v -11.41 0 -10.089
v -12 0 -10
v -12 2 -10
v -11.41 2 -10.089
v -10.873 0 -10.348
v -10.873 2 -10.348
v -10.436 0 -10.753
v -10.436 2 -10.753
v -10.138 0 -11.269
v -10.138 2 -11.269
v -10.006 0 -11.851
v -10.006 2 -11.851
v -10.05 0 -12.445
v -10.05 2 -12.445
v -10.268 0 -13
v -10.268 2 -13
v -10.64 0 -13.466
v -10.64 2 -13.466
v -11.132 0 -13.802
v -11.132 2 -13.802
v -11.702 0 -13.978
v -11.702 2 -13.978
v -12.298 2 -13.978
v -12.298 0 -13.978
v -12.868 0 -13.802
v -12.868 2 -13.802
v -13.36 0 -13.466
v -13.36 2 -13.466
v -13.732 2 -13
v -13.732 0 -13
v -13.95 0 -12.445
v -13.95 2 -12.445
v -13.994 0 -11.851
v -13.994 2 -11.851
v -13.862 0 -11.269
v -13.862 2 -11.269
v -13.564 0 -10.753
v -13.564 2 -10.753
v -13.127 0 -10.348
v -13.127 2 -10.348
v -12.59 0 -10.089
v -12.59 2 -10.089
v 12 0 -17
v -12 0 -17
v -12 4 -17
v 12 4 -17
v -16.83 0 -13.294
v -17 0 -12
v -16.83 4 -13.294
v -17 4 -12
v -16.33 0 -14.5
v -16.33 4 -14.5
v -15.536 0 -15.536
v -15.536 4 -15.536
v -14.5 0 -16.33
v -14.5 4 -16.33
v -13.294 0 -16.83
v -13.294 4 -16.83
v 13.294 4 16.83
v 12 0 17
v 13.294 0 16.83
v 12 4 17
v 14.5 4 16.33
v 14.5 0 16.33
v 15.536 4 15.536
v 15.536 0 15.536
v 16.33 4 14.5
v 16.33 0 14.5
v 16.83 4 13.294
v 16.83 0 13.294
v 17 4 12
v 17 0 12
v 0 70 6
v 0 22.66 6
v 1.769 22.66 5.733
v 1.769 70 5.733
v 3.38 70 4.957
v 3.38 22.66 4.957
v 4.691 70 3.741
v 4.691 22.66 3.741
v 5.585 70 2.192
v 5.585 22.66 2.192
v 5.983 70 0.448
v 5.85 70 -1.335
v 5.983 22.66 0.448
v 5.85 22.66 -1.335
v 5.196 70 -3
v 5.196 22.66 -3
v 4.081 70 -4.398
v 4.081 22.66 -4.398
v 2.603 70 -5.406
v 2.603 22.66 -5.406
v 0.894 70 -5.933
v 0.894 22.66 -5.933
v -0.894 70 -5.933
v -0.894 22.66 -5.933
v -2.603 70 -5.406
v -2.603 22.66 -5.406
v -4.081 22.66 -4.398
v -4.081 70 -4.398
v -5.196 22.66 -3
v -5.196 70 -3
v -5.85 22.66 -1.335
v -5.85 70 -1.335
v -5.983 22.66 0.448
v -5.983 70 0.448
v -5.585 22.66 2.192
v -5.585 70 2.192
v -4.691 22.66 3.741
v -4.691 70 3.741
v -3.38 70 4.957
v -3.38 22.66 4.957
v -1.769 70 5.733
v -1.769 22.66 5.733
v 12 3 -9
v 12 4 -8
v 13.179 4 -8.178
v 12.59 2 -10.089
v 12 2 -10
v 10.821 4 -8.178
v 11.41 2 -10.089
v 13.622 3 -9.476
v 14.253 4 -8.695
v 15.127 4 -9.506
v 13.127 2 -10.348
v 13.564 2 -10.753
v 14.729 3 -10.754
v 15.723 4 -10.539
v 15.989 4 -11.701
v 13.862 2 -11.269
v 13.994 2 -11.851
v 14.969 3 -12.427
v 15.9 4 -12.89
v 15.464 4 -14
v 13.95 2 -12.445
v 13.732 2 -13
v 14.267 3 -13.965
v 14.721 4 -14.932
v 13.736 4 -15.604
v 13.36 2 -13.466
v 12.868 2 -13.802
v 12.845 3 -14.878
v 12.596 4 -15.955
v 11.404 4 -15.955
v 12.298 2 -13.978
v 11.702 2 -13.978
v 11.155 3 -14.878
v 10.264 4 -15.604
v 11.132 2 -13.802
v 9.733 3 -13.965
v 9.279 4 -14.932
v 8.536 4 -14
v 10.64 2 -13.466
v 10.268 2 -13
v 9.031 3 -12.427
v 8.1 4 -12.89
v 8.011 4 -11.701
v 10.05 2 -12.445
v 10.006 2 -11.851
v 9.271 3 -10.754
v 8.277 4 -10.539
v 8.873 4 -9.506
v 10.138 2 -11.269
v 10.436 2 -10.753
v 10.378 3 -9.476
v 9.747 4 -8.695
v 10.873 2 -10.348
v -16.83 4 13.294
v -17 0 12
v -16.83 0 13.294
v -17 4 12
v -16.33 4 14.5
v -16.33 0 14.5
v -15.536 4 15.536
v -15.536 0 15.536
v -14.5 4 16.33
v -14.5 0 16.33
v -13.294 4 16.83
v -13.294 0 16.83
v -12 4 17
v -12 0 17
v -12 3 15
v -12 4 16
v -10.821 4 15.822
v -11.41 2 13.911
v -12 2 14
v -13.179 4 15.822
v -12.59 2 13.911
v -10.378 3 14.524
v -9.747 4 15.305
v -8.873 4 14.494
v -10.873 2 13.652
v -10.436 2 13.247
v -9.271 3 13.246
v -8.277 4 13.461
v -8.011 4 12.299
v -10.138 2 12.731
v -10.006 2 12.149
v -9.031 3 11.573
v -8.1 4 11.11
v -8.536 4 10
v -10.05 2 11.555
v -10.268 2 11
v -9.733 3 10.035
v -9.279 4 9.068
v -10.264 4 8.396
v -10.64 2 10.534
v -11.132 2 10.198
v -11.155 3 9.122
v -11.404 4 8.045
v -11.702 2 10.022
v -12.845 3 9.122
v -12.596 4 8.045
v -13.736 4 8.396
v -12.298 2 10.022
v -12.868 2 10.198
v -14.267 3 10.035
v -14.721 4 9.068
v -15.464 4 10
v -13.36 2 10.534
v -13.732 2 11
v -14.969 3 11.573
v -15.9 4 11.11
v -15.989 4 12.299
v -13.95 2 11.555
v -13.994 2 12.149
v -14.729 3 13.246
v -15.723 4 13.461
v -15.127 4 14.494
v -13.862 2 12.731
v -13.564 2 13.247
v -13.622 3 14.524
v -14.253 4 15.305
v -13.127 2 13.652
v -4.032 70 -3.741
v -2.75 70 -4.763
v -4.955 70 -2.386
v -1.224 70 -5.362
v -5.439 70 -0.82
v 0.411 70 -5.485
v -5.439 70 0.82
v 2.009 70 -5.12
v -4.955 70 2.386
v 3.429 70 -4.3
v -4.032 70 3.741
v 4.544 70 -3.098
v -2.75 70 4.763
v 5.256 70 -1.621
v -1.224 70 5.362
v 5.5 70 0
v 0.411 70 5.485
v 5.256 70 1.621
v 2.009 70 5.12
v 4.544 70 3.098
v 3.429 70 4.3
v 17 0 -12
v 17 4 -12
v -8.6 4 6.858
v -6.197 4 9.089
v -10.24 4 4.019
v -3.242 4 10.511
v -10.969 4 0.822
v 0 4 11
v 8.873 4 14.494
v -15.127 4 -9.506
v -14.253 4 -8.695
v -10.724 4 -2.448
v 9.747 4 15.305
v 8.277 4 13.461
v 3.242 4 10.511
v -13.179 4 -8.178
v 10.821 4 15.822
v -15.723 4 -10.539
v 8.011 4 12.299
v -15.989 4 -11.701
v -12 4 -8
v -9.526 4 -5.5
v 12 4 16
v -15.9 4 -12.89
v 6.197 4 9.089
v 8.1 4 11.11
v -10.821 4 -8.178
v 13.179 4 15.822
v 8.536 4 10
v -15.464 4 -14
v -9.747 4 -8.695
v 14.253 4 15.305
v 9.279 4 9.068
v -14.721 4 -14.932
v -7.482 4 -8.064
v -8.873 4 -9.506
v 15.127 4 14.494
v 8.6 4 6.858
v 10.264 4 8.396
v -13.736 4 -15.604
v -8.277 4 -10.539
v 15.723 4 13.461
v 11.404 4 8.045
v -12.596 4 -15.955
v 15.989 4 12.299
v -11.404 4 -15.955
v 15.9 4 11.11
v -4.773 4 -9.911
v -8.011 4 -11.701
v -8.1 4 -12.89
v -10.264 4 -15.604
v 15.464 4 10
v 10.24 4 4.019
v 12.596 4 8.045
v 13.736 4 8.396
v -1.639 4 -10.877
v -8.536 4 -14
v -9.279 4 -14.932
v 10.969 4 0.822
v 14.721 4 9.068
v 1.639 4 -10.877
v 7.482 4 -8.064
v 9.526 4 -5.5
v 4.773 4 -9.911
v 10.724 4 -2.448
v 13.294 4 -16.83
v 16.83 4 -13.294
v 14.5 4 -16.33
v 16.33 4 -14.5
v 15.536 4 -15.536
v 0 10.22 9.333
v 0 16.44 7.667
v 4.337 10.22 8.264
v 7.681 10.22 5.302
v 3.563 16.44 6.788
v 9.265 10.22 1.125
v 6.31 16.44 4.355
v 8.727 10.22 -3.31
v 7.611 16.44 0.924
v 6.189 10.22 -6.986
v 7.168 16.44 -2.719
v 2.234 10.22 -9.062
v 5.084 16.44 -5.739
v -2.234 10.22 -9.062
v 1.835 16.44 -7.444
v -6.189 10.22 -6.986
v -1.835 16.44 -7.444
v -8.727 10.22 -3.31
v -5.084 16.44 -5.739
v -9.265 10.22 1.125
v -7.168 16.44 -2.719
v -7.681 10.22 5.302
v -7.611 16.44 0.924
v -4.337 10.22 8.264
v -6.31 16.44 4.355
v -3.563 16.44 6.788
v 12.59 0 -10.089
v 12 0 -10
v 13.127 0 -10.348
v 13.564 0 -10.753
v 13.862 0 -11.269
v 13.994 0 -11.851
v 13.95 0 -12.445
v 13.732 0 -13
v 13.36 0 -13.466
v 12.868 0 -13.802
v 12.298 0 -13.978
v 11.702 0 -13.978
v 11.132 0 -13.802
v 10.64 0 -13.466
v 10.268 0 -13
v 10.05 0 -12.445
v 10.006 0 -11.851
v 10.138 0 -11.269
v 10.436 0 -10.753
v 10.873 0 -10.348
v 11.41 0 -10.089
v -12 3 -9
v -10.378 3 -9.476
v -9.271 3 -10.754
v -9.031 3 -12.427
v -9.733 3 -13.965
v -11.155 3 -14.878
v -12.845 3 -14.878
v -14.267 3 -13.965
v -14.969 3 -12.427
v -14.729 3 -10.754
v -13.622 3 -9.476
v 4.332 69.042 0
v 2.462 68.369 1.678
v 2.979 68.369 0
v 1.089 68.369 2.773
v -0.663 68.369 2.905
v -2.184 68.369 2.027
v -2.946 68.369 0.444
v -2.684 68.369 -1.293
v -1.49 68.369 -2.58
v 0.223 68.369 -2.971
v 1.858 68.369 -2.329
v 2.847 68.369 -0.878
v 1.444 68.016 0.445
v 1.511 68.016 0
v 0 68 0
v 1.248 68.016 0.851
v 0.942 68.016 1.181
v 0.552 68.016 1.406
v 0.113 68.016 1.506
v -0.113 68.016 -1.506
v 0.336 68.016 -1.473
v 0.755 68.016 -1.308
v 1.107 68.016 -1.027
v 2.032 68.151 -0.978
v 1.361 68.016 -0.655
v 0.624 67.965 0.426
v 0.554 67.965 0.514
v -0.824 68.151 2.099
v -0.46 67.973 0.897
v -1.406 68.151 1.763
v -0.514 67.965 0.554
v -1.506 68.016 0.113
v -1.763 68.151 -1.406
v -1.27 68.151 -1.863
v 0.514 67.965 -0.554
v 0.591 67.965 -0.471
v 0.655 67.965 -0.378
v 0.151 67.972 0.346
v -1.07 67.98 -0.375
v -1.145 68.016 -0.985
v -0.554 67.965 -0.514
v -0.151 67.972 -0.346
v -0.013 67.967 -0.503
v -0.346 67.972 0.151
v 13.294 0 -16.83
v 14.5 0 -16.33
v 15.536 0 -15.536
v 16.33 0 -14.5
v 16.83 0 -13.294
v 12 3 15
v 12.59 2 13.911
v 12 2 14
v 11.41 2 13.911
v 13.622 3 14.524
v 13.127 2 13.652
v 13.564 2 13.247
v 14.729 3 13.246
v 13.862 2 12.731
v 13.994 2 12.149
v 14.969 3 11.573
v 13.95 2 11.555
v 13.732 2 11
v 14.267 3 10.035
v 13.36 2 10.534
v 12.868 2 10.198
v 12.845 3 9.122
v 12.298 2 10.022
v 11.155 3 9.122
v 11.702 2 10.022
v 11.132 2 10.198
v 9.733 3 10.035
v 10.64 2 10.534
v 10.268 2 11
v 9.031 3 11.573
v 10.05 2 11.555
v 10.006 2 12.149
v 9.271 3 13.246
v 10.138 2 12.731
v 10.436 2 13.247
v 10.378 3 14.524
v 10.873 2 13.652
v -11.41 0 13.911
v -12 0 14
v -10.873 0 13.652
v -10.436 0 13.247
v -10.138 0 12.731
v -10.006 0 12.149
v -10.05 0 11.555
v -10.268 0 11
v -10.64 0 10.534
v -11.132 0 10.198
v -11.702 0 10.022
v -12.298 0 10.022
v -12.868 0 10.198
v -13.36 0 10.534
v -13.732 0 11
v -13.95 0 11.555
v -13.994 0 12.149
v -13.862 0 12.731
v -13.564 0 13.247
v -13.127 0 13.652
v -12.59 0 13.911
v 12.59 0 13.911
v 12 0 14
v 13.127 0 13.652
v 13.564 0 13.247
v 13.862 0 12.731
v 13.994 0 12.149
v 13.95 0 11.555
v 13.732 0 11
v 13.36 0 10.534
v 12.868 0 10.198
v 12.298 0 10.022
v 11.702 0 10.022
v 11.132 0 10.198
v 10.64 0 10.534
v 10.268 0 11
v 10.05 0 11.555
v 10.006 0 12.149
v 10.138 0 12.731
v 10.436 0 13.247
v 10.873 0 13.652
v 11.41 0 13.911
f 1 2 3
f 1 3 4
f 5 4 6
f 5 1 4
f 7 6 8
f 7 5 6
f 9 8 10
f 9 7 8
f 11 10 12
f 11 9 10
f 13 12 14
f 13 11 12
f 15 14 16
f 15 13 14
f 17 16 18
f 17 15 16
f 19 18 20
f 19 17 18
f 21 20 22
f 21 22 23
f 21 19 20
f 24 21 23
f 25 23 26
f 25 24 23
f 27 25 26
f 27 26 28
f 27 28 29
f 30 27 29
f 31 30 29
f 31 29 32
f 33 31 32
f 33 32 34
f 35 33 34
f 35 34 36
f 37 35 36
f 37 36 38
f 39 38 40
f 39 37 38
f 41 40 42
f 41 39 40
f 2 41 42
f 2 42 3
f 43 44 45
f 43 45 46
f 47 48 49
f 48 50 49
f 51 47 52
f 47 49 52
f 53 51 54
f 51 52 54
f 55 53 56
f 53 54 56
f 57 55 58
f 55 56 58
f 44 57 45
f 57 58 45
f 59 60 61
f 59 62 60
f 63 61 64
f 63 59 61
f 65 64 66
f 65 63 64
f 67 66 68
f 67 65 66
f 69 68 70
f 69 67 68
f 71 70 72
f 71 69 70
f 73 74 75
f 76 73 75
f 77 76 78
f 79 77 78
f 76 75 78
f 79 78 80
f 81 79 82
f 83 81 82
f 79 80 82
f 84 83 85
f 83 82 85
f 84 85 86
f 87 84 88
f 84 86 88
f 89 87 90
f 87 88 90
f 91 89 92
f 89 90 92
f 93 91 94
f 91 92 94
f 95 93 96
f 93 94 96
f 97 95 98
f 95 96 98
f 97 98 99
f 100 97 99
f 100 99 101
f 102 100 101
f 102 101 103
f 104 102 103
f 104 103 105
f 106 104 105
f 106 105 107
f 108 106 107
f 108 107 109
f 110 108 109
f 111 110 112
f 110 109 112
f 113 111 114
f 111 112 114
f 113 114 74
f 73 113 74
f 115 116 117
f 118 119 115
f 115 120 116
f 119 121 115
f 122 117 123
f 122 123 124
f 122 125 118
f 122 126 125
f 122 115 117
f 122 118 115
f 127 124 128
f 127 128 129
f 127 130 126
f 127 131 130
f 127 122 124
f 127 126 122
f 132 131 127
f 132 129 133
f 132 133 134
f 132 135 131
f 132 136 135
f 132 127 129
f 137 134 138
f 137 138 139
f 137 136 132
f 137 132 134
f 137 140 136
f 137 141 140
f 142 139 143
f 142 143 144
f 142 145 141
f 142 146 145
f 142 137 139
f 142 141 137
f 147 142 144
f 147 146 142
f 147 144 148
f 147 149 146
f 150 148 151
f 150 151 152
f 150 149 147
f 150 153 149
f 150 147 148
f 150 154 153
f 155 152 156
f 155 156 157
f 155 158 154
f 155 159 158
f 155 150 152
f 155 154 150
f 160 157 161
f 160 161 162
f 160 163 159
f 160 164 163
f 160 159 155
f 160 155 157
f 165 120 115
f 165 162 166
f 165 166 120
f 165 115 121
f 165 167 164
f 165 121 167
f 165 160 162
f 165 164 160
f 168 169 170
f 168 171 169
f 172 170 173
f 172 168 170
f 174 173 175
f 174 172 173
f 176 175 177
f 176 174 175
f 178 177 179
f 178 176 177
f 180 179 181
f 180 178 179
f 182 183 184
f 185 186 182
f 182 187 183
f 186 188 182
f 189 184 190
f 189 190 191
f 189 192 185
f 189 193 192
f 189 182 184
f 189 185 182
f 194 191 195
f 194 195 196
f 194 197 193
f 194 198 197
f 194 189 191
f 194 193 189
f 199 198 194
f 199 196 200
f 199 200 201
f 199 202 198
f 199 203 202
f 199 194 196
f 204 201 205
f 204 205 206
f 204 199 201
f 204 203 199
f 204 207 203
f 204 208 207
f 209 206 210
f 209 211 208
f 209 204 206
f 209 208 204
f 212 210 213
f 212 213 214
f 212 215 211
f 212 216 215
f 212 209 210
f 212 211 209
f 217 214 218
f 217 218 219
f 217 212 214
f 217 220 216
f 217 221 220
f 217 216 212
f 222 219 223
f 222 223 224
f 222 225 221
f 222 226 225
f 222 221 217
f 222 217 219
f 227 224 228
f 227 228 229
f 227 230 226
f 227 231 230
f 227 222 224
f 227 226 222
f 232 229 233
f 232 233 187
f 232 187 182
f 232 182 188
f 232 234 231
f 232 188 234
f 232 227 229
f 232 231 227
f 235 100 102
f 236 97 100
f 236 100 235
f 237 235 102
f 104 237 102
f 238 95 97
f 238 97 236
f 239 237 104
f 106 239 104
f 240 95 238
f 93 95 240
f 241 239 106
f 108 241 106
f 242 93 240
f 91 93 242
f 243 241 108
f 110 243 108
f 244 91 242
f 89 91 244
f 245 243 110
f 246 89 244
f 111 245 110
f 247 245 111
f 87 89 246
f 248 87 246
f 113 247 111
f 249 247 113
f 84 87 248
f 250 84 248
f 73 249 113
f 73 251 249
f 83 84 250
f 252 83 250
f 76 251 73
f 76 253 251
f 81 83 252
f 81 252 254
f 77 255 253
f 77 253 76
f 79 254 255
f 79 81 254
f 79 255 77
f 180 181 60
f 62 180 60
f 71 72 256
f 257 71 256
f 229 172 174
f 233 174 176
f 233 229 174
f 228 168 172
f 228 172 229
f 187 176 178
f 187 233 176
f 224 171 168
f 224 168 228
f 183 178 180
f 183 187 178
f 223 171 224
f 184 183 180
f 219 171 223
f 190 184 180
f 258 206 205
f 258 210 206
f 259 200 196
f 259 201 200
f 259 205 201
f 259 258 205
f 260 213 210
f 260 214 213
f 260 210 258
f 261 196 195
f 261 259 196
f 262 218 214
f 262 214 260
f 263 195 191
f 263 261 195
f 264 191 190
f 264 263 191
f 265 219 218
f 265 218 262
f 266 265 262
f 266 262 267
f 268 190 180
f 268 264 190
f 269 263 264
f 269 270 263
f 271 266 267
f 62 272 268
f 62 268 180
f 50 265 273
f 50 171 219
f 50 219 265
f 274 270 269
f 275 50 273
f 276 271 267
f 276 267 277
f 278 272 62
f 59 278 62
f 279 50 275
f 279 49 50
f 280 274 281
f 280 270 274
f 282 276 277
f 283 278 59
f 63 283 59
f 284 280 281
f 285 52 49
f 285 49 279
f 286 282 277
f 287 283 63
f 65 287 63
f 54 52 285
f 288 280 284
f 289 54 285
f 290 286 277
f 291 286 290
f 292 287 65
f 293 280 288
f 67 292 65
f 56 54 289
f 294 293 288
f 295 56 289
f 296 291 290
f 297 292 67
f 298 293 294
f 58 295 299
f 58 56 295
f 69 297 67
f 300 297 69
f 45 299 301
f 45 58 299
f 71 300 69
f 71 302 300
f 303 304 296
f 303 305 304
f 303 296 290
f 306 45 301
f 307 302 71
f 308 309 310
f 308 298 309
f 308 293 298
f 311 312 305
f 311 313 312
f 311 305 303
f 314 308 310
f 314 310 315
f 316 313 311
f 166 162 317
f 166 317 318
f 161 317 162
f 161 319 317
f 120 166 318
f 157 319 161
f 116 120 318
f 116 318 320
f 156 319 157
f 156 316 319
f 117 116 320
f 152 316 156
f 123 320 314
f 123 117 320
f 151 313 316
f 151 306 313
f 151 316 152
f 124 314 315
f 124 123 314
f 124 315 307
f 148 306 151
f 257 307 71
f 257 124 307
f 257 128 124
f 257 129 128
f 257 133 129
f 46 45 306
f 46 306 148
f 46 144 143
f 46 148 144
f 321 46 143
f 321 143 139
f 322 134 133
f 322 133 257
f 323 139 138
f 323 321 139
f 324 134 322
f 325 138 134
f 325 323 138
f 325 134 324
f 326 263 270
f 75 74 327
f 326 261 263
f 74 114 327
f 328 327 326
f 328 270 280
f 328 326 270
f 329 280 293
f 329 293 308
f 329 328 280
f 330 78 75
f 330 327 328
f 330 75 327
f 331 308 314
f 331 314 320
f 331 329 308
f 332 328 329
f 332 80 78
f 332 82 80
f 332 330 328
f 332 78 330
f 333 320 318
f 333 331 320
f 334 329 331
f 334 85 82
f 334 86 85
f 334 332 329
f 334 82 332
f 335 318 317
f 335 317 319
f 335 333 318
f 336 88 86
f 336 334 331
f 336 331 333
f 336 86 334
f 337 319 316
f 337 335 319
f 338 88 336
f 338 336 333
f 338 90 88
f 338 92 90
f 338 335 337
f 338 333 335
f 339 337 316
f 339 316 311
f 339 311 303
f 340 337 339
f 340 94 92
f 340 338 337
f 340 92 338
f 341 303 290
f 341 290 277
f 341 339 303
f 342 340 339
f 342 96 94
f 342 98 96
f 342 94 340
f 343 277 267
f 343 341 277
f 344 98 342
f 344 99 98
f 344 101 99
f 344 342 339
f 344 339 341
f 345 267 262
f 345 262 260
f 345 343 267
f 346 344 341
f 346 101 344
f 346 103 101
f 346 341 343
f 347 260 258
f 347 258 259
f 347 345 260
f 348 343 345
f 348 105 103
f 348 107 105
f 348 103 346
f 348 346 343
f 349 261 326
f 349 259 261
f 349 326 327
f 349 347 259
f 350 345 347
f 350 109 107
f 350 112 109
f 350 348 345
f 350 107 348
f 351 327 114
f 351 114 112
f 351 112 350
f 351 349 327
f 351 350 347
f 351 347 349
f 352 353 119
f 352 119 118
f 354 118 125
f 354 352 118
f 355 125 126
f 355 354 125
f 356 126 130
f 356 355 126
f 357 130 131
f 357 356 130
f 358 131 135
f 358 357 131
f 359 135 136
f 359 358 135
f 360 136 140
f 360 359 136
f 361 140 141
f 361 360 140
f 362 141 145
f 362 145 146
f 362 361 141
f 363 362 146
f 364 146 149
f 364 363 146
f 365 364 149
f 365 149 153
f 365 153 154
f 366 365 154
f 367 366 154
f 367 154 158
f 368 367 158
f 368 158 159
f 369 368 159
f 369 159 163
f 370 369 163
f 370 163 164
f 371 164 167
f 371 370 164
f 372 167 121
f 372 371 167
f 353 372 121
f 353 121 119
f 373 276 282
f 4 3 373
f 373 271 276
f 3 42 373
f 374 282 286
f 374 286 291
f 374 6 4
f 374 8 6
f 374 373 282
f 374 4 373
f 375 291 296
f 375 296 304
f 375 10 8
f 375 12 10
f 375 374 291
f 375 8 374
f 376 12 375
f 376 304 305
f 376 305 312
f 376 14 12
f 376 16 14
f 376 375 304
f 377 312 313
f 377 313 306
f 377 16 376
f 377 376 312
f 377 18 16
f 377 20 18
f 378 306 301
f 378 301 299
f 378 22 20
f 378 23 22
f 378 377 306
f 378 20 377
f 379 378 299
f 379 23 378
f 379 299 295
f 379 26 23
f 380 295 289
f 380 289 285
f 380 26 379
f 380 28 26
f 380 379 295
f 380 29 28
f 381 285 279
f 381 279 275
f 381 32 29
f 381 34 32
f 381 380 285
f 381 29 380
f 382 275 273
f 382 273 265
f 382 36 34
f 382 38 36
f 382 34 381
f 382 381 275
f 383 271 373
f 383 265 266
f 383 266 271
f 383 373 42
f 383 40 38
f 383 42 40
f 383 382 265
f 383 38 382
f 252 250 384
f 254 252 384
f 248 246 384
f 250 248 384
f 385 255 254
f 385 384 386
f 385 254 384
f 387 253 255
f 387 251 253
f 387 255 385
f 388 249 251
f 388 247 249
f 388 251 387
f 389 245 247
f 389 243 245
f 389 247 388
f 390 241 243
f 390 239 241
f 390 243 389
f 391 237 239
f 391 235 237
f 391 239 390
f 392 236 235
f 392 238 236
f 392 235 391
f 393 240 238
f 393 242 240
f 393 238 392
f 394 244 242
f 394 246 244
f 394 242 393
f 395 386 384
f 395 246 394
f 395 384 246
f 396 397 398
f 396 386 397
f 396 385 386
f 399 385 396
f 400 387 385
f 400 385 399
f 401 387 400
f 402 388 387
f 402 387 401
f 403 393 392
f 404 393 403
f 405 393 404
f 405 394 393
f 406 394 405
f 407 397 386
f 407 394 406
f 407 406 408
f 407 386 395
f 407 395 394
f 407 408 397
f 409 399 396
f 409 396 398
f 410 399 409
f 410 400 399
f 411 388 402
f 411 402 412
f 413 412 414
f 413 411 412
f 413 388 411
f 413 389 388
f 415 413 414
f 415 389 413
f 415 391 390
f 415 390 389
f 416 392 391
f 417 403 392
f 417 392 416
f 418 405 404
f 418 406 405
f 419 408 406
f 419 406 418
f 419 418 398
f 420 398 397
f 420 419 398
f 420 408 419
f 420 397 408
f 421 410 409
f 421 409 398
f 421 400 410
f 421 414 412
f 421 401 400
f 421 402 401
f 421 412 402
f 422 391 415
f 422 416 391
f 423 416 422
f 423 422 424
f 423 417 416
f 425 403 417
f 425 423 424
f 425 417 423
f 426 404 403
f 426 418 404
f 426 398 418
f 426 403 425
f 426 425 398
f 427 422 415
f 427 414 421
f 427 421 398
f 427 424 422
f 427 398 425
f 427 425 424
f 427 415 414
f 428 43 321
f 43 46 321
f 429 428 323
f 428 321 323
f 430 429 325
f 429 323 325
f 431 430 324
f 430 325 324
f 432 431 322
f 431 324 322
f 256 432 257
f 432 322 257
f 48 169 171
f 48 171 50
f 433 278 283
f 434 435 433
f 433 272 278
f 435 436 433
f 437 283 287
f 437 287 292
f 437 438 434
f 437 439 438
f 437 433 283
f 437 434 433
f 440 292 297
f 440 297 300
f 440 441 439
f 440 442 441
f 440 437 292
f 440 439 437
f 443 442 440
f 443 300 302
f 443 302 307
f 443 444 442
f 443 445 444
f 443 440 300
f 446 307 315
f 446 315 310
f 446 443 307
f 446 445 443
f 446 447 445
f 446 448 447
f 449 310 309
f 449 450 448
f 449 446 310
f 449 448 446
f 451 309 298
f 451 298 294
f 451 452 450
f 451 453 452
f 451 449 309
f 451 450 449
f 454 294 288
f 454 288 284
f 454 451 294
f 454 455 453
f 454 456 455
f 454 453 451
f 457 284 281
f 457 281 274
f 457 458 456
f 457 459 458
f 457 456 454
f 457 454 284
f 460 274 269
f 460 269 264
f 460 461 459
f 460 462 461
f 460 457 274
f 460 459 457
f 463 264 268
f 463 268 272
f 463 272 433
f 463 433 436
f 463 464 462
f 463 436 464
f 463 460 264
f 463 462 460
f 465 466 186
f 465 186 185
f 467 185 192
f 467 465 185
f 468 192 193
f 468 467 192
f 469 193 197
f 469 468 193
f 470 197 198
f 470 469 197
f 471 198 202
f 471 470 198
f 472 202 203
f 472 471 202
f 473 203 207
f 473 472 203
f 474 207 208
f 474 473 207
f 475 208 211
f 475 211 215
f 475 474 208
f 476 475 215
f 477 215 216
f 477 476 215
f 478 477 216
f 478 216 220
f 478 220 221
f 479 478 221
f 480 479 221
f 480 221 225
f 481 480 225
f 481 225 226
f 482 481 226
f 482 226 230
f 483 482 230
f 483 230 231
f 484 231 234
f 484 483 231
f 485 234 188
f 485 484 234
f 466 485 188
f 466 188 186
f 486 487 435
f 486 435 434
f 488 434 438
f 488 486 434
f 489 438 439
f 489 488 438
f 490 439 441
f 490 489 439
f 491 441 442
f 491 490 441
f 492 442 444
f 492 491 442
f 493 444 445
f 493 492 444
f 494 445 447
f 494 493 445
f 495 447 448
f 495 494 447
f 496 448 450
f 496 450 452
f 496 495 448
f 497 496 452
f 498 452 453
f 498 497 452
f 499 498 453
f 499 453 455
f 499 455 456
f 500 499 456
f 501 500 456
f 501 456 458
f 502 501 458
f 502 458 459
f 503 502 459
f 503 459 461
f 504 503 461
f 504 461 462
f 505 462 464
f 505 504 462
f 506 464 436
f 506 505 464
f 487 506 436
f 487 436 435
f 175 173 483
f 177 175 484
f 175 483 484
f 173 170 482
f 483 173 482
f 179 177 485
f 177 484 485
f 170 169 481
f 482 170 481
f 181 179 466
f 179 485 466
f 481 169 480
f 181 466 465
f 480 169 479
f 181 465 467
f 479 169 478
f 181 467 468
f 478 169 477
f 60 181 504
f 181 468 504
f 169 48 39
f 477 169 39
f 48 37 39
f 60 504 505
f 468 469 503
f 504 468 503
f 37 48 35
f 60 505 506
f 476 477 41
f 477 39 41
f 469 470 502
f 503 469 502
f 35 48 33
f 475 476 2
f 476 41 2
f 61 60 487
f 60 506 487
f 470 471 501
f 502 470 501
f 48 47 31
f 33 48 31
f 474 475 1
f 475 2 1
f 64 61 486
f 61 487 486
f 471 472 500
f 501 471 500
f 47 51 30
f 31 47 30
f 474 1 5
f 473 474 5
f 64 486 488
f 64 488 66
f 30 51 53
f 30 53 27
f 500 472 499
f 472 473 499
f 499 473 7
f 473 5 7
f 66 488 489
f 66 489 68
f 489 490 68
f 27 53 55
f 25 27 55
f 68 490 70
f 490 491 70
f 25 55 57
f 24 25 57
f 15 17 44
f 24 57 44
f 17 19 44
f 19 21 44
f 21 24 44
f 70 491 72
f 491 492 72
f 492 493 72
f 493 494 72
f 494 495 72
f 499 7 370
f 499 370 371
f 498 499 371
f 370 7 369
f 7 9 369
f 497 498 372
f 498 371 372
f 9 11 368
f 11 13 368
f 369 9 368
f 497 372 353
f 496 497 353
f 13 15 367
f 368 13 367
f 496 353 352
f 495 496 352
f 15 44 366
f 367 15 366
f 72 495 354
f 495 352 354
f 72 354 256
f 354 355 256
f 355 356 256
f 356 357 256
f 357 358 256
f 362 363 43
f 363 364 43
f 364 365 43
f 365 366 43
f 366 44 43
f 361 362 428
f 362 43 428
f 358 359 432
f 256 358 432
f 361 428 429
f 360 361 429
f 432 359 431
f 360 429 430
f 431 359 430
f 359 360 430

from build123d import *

# Parameters (mm, degrees)
SKETCH_1_W      = 34
SKETCH_1_H      = 34
SKETCH_1_R      = 2
EXTRUDE_1_DEPTH = 4
FILLET_1_R      = 5
SKETCH_2_R      = 6
EXTRUDE_2_DEPTH = 66
CHAMFER_1_SIZE  = 5
CHAMFER_1_SIZE2 = 18.660254038
CHAMFER_2_SIZE  = 2


with BuildPart() as part:
    # Эскиз1 → Бобышка-Вытянуть1 (new body)
    with BuildSketch(Plane(origin=(0, 0, 0), x_dir=(1, 0, 0), z_dir=(0, 1, 0))):
        Rectangle(SKETCH_1_W, SKETCH_1_H)
        with Locations(Location((-12, 12, 0), (0, 0, 270))):
            Circle(SKETCH_1_R, mode=Mode.SUBTRACT)
        with Locations(Location((12, 12, 0), (0, 0, 270))):
            Circle(SKETCH_1_R, mode=Mode.SUBTRACT)
        with Locations(Location((12, -12, 0), (0, 0, 270))):
            Circle(SKETCH_1_R, mode=Mode.SUBTRACT)
        with Locations(Location((-12, -12, 0), (0, 0, 270))):
            Circle(SKETCH_1_R, mode=Mode.SUBTRACT)
    extrude(amount=EXTRUDE_1_DEPTH)

    # Скругление1
    fillet_1_edges = [part.edges().sort_by_distance(p)[0] for p in [
        (17, 2, 17),
        (-17, 2, 17),
        (-17, 2, -17),
        (17, 2, -17),
    ]]
    fillet(fillet_1_edges, radius=FILLET_1_R)

    # Эскиз2 → Бобышка-Вытянуть2 (add)
    with BuildSketch(Plane(origin=(0, 4, 0), x_dir=(1, 0, 0), z_dir=(0, 1, 0))):
        with Locations(Location((0, 0, 0), (0, 0, 270))):
            Circle(SKETCH_2_R)
    extrude(amount=EXTRUDE_2_DEPTH)

    # Эскиз7 → Вырез-Повернуть3 (revolve, cut)
    with BuildSketch(Plane.XY):
        with BuildLine():
            Line((5.5, 70), (0, 70))
            Line((0, 70), (0, 68))
            ThreePointArc((0, 68), (2.979435889, 68.369051304), (5.5, 70))
        make_face()
    revolve(axis=Axis((0, 82.404747685, 0), (0, -1, 0)), mode=Mode.SUBTRACT)

    # Фаска1
    chamfer_1_edges = [part.edges().sort_by_distance(p)[0] for p in [
        (0, 4, -6),
    ]]
    chamfer_1_side = [part.faces().sort_by_distance(p)[0] for p in [
        (0, 4, 16.519167389),
    ]]
    chamfer(chamfer_1_edges, length=CHAMFER_1_SIZE, length2=CHAMFER_1_SIZE2, reference=chamfer_1_side[0])

    # Фаска2
    chamfer_2_edges = [part.edges().sort_by_distance(p)[0] for p in [
        (-12, 4, -14),
        (12, 4, -14),
        (12, 4, 10),
        (-12, 4, 10),
    ]]
    chamfer(chamfer_2_edges, length=CHAMFER_2_SIZE)


solid = part.part
